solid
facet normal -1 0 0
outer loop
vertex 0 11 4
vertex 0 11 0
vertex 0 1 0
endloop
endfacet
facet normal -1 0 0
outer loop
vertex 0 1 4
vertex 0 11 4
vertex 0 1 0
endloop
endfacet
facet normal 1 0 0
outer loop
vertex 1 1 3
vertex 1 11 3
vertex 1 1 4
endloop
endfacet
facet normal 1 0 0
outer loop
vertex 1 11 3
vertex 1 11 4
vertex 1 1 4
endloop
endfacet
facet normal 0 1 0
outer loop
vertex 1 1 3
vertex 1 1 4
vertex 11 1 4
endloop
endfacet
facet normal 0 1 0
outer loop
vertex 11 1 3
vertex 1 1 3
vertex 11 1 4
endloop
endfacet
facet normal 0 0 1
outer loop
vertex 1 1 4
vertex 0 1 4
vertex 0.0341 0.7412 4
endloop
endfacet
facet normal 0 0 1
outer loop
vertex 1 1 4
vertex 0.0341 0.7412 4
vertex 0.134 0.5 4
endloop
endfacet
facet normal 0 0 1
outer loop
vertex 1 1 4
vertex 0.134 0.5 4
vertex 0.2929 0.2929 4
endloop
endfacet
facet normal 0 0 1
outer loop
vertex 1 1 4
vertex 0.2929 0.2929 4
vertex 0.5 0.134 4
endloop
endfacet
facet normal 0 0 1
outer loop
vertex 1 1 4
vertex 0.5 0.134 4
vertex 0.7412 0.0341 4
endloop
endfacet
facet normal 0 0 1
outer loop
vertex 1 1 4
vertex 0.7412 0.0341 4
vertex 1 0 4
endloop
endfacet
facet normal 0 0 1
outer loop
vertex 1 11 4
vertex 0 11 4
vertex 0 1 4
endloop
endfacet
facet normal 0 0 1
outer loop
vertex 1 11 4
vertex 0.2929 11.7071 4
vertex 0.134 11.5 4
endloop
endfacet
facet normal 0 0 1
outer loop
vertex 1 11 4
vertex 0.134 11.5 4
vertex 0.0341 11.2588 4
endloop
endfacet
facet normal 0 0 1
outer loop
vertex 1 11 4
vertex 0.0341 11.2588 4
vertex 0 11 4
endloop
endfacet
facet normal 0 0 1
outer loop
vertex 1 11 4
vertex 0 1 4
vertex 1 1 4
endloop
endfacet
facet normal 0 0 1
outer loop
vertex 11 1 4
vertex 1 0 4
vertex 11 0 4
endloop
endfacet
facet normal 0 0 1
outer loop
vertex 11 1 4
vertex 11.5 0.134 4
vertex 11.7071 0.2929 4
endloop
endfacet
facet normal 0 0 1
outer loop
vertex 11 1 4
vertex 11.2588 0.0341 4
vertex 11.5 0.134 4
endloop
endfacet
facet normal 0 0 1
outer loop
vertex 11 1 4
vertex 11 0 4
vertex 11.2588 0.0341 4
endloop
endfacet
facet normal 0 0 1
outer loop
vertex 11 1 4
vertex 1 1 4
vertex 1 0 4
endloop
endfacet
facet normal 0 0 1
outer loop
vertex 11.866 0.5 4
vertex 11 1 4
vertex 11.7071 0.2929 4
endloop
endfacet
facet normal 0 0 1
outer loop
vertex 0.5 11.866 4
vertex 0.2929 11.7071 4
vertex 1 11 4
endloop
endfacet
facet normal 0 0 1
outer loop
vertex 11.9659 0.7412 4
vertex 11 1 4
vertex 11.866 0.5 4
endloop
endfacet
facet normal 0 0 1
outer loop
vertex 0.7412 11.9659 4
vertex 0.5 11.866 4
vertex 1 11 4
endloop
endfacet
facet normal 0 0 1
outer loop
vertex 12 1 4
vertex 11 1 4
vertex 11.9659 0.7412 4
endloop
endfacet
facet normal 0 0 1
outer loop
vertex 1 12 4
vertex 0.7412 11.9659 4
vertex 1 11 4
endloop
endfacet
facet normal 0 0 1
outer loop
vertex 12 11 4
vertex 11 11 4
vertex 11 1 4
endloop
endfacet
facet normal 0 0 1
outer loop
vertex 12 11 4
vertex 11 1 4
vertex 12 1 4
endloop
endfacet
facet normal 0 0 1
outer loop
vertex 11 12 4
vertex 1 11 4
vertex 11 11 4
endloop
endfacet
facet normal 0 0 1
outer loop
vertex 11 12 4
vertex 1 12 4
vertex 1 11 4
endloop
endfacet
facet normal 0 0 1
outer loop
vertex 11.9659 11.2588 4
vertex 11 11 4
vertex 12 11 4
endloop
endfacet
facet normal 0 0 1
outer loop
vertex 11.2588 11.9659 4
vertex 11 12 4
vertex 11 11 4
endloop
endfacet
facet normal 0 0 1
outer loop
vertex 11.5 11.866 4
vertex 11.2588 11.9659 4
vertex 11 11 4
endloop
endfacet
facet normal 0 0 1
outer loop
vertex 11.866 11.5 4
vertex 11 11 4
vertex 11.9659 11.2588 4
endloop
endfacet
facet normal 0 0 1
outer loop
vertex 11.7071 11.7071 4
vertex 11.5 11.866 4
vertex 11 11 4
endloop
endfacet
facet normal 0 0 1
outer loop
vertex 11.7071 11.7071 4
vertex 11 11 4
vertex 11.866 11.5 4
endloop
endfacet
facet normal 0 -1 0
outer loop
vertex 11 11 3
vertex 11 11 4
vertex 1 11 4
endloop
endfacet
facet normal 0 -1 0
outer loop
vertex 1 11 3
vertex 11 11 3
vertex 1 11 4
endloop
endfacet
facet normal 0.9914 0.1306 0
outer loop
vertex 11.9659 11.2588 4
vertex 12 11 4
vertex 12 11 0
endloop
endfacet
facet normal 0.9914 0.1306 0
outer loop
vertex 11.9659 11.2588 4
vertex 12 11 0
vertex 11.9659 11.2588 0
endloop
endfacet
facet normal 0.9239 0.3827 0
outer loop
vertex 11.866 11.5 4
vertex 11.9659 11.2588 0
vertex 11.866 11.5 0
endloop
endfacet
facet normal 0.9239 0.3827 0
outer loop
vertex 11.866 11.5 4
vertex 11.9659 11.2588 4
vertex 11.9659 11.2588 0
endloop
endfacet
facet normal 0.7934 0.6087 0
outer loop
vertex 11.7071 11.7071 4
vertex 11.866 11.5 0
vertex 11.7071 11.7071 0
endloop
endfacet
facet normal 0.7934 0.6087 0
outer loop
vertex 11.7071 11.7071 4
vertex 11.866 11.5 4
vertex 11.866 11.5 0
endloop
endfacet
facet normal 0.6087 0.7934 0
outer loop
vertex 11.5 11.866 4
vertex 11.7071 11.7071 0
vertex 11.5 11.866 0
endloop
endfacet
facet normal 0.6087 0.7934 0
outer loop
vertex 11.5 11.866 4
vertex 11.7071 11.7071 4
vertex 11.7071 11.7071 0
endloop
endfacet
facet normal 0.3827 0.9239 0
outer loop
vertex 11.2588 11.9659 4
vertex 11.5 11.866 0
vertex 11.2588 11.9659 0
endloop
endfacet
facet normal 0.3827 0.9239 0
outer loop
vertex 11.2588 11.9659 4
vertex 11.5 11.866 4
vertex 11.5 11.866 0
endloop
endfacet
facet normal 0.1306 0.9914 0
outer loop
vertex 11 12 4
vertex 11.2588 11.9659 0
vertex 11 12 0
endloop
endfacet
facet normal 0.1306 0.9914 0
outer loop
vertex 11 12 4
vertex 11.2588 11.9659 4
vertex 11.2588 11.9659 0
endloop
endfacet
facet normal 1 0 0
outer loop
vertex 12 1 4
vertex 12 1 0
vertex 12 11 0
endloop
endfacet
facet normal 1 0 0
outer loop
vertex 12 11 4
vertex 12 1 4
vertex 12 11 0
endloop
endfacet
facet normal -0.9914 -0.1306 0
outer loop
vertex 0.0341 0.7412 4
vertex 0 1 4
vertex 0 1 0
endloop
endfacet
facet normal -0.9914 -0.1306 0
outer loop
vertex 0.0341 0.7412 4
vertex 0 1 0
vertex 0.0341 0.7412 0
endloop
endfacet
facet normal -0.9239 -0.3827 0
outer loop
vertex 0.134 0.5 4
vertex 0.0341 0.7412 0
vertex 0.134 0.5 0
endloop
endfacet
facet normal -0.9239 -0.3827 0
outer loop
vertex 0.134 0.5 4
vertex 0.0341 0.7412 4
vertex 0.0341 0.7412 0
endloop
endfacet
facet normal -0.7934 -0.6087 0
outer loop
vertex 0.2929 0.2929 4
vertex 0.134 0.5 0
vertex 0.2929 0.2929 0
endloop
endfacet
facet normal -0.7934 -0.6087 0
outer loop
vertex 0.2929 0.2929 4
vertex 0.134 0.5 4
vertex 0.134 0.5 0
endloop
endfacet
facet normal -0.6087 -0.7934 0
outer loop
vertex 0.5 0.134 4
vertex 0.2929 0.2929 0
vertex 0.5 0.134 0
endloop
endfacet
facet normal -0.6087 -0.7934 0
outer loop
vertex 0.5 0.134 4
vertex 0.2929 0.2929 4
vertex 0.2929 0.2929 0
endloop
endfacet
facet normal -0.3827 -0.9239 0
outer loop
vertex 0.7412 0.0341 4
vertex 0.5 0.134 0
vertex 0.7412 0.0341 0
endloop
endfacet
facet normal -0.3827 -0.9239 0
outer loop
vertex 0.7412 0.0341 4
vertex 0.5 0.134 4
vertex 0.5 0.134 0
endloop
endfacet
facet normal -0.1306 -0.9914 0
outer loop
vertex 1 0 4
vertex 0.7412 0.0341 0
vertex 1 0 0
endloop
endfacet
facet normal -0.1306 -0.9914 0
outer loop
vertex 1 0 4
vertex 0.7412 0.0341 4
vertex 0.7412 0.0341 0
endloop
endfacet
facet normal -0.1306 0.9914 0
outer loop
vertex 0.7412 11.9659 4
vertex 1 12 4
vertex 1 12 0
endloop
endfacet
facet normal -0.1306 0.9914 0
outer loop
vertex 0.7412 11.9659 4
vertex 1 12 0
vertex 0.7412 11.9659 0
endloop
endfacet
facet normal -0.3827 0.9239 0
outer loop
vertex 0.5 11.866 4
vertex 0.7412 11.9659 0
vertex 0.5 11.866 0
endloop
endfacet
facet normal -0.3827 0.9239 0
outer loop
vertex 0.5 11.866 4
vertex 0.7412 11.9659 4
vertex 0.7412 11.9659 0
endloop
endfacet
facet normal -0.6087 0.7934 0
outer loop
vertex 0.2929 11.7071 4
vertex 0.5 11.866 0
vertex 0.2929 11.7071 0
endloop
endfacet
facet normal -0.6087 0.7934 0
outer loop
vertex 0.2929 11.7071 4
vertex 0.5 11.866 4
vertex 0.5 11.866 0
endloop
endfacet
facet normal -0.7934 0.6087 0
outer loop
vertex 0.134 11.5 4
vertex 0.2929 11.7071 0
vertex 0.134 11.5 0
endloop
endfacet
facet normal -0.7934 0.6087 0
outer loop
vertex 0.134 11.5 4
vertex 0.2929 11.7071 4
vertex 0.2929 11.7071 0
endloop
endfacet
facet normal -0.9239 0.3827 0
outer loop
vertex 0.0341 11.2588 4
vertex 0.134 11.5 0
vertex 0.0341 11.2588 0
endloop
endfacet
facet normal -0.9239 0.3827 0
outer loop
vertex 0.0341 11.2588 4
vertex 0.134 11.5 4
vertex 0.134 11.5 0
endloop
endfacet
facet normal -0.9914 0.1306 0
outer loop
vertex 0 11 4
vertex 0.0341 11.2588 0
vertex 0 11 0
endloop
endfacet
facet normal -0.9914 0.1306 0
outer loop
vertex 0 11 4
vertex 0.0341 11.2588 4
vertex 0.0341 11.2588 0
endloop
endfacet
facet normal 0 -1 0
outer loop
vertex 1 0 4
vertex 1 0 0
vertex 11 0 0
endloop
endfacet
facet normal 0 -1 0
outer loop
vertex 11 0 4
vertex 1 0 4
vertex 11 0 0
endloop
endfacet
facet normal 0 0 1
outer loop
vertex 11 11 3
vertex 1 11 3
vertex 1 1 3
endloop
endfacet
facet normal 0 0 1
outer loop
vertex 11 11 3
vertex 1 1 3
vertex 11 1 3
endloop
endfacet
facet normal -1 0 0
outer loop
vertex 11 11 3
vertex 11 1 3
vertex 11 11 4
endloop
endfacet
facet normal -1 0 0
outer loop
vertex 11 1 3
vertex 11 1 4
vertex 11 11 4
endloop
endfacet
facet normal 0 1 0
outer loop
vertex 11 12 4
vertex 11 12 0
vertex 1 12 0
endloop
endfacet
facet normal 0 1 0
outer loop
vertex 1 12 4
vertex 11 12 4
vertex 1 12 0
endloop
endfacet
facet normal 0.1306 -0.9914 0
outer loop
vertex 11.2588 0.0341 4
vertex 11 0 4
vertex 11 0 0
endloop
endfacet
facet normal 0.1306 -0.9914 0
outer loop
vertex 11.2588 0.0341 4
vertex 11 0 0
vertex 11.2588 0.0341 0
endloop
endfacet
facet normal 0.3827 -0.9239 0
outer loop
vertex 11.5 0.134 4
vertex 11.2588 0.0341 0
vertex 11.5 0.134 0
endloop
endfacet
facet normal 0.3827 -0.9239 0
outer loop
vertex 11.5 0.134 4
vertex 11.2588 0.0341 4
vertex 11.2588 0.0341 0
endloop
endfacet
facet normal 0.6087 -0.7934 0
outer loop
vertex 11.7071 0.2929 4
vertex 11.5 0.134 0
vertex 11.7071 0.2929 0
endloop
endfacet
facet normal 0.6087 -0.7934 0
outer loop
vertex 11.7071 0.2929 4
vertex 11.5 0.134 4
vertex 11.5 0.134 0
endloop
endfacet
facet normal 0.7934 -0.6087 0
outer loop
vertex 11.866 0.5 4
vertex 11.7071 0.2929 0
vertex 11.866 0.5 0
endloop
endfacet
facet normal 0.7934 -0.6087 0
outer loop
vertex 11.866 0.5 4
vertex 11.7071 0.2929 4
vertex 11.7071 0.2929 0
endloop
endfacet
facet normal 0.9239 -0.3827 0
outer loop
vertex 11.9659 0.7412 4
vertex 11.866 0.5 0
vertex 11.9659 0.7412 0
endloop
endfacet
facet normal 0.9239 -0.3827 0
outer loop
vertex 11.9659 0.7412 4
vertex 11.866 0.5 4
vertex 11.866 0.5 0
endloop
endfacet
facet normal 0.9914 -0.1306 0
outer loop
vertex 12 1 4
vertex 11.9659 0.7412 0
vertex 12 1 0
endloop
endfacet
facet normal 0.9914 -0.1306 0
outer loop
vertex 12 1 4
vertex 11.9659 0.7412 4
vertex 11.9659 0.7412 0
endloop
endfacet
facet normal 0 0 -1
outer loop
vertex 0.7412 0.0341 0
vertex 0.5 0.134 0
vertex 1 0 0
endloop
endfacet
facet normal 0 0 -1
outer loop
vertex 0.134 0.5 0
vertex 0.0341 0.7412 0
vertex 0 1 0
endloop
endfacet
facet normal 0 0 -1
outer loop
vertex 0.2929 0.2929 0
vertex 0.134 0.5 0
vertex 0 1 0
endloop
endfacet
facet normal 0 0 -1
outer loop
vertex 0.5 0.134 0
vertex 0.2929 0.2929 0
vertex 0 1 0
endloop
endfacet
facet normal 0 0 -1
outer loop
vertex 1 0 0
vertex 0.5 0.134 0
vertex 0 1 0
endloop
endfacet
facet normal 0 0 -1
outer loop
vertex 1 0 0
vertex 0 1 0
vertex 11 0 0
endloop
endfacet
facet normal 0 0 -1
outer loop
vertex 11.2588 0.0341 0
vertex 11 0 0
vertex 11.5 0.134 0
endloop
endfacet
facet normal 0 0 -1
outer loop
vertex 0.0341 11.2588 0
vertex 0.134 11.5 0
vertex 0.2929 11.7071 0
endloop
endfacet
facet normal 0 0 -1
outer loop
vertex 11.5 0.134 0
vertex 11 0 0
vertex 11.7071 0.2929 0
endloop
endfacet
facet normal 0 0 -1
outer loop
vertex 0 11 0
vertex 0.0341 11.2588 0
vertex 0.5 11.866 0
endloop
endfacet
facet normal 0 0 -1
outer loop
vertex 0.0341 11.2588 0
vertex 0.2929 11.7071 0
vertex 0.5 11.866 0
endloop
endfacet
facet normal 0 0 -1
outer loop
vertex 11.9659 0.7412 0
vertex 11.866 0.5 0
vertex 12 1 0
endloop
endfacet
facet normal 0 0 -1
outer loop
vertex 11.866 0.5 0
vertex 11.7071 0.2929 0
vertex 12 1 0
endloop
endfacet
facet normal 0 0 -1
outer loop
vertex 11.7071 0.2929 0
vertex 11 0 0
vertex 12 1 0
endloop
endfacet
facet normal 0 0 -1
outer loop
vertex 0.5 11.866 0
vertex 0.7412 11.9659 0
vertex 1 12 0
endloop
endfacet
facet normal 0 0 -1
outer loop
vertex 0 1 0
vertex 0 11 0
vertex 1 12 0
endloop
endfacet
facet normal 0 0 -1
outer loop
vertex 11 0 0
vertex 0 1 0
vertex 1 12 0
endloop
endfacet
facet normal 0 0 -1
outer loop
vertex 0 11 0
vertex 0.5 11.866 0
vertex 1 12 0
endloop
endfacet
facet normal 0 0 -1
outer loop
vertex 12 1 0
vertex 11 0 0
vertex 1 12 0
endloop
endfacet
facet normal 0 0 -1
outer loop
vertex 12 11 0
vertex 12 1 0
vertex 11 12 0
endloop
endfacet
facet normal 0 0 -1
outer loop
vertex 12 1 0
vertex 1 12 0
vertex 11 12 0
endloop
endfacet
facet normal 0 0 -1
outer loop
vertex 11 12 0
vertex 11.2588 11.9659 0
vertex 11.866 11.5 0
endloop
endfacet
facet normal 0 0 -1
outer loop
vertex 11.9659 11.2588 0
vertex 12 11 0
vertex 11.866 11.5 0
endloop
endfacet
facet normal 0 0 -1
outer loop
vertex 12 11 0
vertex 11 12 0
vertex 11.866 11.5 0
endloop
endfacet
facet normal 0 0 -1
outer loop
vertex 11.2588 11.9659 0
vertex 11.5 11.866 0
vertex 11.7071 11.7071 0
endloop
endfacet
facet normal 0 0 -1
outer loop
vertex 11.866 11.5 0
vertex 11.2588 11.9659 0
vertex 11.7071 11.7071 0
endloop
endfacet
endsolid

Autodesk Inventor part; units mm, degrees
ref_plane "YZ Plane" through (0, 0, 0) normal (1, 0, 0) x (0, 1, 0)
ref_plane "XZ Plane" through (0, 0, 0) normal (0, 1, 0) x (-1, 0, 0)
ref_plane "XY Plane" through (0, 0, 0) normal (0, 0, 1) x (1, 0, 0)
sketch "Sketch1" plane through (0, 0, 0) normal (0, 0, 1) x (1, 0, 0)
  line L0 (0, 0) -> (12, 0)
  line L1 (12, 0) -> (12, 12)
  line L2 (12, 12) -> (0, 12)
  line L3 (0, 12) -> (0, 0)
  dimension "d0" = 12
  dimension "d1" = 12
extrude "Extrusion1" add sketch "Sketch1" along normal blind 4
fillet "Fillet1" radius 1 1 edges at (12, 12, 2)
fillet "Fillet2" radius 1 3 edges at (0, 12, 2) (12, 0, 2) (0, 0, 2)
sketch "Sketch2" plane through (0, 0, 4) normal (0, 0, 1) x (1, 0, 0)
  line L0 (1, 1) -> (11, 1)
  line L1 (11, 1) -> (11, 11)
  line L2 (11, 11) -> (1, 11)
  line L3 (1, 11) -> (1, 1)
  point P0 (0, 0)
  point P1 (1, 0)
  dimension "d7" = 1
  dimension "d8" = 10
  dimension "d9" = 10
extrude "Extrusion2" cut sketch "Sketch2" against normal blind 1
sketch "Sketch3" plane through (0, 0, 3) normal (0, 0, 1) x (1, 0, 0)
  point P0 (0, 0)
properties part number "BTN_1"
